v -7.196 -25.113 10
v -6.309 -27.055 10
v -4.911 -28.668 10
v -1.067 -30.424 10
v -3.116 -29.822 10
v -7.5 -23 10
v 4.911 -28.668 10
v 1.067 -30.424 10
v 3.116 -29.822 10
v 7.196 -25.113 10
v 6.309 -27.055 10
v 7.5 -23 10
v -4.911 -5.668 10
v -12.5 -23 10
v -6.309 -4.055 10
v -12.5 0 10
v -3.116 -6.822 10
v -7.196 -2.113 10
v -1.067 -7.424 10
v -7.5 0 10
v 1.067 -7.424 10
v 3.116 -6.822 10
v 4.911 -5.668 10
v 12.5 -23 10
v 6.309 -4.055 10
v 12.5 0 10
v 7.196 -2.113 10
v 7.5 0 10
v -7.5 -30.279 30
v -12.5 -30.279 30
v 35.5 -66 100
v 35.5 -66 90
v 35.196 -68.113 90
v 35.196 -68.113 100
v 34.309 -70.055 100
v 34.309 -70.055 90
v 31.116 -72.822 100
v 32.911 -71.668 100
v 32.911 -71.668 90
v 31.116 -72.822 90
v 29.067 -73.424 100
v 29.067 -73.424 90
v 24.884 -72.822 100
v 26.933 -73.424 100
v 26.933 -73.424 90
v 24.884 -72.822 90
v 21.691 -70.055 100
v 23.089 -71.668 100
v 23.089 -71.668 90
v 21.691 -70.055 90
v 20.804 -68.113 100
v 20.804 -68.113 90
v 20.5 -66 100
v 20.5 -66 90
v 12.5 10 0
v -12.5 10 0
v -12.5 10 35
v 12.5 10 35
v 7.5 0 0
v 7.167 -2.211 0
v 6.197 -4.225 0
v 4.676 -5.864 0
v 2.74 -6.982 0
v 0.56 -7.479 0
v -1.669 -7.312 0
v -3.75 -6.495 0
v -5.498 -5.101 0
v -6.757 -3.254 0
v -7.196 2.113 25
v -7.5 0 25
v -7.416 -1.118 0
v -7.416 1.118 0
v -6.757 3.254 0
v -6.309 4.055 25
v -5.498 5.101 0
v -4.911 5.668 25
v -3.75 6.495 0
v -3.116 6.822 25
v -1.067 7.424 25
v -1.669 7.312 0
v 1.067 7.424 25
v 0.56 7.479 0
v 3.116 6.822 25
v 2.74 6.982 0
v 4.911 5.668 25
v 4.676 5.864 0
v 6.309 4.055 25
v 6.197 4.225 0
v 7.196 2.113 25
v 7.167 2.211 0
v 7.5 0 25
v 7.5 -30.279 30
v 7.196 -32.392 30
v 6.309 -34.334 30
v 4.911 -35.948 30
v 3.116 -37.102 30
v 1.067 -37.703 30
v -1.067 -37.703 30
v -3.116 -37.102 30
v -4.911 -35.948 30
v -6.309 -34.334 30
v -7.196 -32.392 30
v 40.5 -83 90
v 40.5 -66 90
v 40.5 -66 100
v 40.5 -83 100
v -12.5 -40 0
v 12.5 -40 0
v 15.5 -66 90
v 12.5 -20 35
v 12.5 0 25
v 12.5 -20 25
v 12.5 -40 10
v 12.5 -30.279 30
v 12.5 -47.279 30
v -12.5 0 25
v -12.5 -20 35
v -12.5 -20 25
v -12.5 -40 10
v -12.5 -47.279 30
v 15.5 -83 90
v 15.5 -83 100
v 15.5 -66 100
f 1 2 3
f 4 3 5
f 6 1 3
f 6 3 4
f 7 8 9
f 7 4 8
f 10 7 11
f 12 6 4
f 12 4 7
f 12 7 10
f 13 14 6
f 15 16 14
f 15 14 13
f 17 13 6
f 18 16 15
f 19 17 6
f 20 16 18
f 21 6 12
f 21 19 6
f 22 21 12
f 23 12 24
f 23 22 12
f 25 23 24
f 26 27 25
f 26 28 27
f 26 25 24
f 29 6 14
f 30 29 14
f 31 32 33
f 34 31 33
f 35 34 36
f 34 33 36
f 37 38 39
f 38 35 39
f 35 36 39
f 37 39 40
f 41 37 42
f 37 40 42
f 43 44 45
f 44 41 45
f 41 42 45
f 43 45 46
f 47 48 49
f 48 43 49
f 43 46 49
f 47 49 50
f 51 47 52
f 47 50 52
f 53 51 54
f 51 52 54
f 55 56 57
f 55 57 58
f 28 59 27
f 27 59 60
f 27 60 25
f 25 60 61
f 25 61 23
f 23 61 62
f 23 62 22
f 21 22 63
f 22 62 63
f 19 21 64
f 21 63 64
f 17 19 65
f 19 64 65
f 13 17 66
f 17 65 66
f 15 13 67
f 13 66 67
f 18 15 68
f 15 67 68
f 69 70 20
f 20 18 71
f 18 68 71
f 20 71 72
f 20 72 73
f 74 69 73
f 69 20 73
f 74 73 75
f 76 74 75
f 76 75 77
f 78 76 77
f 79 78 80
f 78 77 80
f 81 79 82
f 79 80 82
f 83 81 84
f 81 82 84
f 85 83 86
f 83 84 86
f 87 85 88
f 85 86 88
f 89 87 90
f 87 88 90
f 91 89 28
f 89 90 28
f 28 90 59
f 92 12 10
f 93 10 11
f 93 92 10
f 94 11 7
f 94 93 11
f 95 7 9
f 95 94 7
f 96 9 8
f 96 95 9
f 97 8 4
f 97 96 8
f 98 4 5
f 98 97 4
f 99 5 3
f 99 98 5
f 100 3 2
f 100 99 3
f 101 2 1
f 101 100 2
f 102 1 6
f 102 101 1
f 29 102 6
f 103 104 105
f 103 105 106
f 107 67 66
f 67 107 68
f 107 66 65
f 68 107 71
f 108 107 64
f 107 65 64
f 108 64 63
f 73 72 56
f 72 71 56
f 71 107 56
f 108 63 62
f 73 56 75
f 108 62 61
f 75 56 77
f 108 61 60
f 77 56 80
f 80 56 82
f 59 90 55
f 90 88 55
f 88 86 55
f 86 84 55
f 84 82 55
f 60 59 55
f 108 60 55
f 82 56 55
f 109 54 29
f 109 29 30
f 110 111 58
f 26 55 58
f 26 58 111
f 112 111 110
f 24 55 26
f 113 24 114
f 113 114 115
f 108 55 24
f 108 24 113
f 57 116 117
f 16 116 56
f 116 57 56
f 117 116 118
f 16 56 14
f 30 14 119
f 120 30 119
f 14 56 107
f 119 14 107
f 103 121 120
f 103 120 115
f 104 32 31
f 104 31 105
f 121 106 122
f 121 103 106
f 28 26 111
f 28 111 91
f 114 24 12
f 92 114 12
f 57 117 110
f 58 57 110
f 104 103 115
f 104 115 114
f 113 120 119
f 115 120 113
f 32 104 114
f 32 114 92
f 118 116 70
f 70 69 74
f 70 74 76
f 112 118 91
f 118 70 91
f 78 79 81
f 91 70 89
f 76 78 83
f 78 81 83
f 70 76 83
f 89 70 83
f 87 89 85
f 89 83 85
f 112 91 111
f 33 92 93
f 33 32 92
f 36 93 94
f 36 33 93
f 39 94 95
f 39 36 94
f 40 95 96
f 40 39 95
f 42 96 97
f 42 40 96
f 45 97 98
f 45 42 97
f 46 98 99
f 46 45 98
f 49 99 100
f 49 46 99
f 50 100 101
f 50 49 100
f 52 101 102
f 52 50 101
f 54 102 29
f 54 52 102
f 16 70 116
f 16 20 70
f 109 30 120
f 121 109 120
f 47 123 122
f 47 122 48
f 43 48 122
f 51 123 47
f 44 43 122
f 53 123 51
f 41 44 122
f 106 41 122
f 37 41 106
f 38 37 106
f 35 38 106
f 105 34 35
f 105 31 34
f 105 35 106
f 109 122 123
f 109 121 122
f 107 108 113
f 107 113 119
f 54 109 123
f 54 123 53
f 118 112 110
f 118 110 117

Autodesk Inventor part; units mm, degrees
ref_plane "YZ Plane" through (0, 0, 0) normal (1, 0, 0) x (0, 1, 0)
sketch "Sketch5" plane through (0, 0, 0) normal (0, 0, 1) x (1, 0, 0)
  line L0 (-12.5, 10) -> (12.5, 10)
  line L1 (12.5, 10) -> (12.5, -40)
  line L2 (12.5, -40) -> (-12.5, -40)
  line L3 (-12.5, -40) -> (-12.5, 10)
  circle A0 centre (0, 0) radius 7.5
  dimension "d11" = 25
  dimension "d12" = 50
  dimension "d13" = 15
  dimension "d14" = 10
  dimension "d15" = 12.5
extrude "Extrusion4" add sketch "Sketch5" along normal blind 10
sketch "Sketch6" plane through (0, 0, 10) normal (0, 0, 1) x (1, 0, 0)
  circle A0 centre (0, 0) radius 7.5 projected
  line L0 (-7.5, 0) -> (-12.5, 0)
  line L1 (-12.5, 10) -> (-12.5, -40) projected
  line L2 (-12.5, 10) -> (-12.5, 0)
  line L3 (12.5, 10) -> (-12.5, 10) projected
  line L4 (12.5, -40) -> (12.5, 10) projected
  line L5 (-12.5, 10) -> (12.5, 10)
  line L6 (12.5, 10) -> (12.5, 0)
  line L7 (12.5, 0) -> (7.5, 0)
  arc A1 (7.5, 0) -> (-7.5, 0) centre (0, 0) ccw
extrude "Extrusion5" add sketch "Sketch6" along normal blind 15 contours A0 L0 L1 L3 L4 L7
sketch "Sketch7" plane through (0, 0, 25) normal (0, 0, 1) x (1, 0, 0)
  line L0 (-12.5, 10) -> (-12.5, -40) projected
  line L1 (12.5, -40) -> (12.5, 0) projected
  line L2 (-12.5, 10) -> (12.5, 10)
  line L3 (12.5, 10) -> (12.5, -20)
  line L4 (12.5, -20) -> (-12.5, -20)
  line L5 (-12.5, -20) -> (-12.5, 10)
  point P0 (0, 0)
  point P1 (-12.5, -20)
  point P2 (12.5, 0)
  dimension "d20" = 30
extrude "Extrusion6" add sketch "Sketch7" along normal blind 10
ref_plane "Work Plane1" through (0, -40, 0) normal (1, 0, 0) x (0, 0, -1)
ref_plane "Work Plane2" through (0, 0, 90) normal (0, 0, 1) x (1, 0, 0)
sketch "Sketch12" plane through (0, 0, 90) normal (0, 0, 1) x (1, 0, 0)
  line L0 (0, 28.6) -> (0, -101.6) projected
  line L1 (-23.1, 0) -> (51.1, 0) projected
  arc A0 (20.5, -66) -> (35.5, -66) centre (28, -66) ccw
  line L2 (20.5, -66) -> (15.5, -66)
  line L3 (15.5, -66) -> (15.5, -83)
  line L4 (15.5, -83) -> (40.5, -83)
  line L5 (40.5, -83) -> (40.5, -66)
  line L6 (40.5, -66) -> (35.5, -66)
  point P0 (0, 0)
  dimension "d55" = 15
  dimension "d56" = 5
  dimension "d57" = 17
  dimension "d58" = 25
sketch "Sketch13" plane through (0, 0, 10) normal (0, 0, 1) x (1, 0, 0)
  line L0 (-7.5, -23) -> (-12.5, -23)
  line L1 (-12.5, 0) -> (-12.5, -40) projected
  line L2 (-12.5, -23) -> (-12.5, -40)
  line L3 (-12.5, -40) -> (12.5, -40) projected
  line L4 (-12.5, -40) -> (12.5, -40)
  line L5 (12.5, -40) -> (12.5, -23)
  line L6 (12.5, -40) -> (12.5, 0) projected
  line L7 (12.5, -23) -> (7.5, -23)
  arc A0 (-7.5, -23) -> (7.5, -23) centre (0, -23) ccw
  line L8 (-12.5, -31.5) -> (12.5, -31.5)
  point P0 (0, 0)
  dimension "d48" = 5
  dimension "d49" = 5
  dimension "d50" = 7.5
  dimension "d51" = 17
sketch "Sketch14" plane through (0, 0, 0) normal (1, 0, 0) x (0, 1, 0)
  line L0 (-40, 10) -> (0, 10) projected
  line L1 (-40, 0) -> (-40, 10) projected
  line L2 (-31.5, 10) -> (-38.7794, 30)
  point P0 (0, 0)
  dimension "d62" = 8.5
  dimension "d63" = 70
  dimension "d64" = 20
sweep "Sweep2" add profiles "Sketch13" path "Sketch14" path curves L2
loft "Loft1" add profiles "Sketch12" section 1 edges at (0, -47.2794, 30) (12.5, -38.7794, 30) (10, -30.2794, 30) (0, -37.7794, 30) (-10, -30.2794, 30) (-12.5, -38.7794, 30)
sketch "Sketch15" plane through (15.5, -83, 90) normal (0, 0, 1) x (1, 0, 0)
  line L0 (5, 17) -> (-23, 52.7206) projected
  line L1 (0, 17) -> (5, 17) projected
  line L2 (5, 17) -> (0, 17)
  line L3 (0, 0) -> (0, 17) projected
  line L4 (0, 17) -> (0, 0)
  line L5 (25, 0) -> (0, 0) projected
  line L6 (0, 0) -> (25, 0)
  line L7 (25, 17) -> (25, 0) projected
  line L8 (25, 0) -> (25, 17)
  line L9 (20, 17) -> (25, 17) projected
  line L10 (25, 17) -> (20, 17)
  arc A0 (5, 17) -> (20, 17) centre (12.5, 17) ccw
  point P0 (-15.5, 83)
extrude "Extrusion7" add sketch "Sketch15" along normal blind 10
equation "\"d15\" = 0.5 * d11"
properties part number "ramp(2)"
